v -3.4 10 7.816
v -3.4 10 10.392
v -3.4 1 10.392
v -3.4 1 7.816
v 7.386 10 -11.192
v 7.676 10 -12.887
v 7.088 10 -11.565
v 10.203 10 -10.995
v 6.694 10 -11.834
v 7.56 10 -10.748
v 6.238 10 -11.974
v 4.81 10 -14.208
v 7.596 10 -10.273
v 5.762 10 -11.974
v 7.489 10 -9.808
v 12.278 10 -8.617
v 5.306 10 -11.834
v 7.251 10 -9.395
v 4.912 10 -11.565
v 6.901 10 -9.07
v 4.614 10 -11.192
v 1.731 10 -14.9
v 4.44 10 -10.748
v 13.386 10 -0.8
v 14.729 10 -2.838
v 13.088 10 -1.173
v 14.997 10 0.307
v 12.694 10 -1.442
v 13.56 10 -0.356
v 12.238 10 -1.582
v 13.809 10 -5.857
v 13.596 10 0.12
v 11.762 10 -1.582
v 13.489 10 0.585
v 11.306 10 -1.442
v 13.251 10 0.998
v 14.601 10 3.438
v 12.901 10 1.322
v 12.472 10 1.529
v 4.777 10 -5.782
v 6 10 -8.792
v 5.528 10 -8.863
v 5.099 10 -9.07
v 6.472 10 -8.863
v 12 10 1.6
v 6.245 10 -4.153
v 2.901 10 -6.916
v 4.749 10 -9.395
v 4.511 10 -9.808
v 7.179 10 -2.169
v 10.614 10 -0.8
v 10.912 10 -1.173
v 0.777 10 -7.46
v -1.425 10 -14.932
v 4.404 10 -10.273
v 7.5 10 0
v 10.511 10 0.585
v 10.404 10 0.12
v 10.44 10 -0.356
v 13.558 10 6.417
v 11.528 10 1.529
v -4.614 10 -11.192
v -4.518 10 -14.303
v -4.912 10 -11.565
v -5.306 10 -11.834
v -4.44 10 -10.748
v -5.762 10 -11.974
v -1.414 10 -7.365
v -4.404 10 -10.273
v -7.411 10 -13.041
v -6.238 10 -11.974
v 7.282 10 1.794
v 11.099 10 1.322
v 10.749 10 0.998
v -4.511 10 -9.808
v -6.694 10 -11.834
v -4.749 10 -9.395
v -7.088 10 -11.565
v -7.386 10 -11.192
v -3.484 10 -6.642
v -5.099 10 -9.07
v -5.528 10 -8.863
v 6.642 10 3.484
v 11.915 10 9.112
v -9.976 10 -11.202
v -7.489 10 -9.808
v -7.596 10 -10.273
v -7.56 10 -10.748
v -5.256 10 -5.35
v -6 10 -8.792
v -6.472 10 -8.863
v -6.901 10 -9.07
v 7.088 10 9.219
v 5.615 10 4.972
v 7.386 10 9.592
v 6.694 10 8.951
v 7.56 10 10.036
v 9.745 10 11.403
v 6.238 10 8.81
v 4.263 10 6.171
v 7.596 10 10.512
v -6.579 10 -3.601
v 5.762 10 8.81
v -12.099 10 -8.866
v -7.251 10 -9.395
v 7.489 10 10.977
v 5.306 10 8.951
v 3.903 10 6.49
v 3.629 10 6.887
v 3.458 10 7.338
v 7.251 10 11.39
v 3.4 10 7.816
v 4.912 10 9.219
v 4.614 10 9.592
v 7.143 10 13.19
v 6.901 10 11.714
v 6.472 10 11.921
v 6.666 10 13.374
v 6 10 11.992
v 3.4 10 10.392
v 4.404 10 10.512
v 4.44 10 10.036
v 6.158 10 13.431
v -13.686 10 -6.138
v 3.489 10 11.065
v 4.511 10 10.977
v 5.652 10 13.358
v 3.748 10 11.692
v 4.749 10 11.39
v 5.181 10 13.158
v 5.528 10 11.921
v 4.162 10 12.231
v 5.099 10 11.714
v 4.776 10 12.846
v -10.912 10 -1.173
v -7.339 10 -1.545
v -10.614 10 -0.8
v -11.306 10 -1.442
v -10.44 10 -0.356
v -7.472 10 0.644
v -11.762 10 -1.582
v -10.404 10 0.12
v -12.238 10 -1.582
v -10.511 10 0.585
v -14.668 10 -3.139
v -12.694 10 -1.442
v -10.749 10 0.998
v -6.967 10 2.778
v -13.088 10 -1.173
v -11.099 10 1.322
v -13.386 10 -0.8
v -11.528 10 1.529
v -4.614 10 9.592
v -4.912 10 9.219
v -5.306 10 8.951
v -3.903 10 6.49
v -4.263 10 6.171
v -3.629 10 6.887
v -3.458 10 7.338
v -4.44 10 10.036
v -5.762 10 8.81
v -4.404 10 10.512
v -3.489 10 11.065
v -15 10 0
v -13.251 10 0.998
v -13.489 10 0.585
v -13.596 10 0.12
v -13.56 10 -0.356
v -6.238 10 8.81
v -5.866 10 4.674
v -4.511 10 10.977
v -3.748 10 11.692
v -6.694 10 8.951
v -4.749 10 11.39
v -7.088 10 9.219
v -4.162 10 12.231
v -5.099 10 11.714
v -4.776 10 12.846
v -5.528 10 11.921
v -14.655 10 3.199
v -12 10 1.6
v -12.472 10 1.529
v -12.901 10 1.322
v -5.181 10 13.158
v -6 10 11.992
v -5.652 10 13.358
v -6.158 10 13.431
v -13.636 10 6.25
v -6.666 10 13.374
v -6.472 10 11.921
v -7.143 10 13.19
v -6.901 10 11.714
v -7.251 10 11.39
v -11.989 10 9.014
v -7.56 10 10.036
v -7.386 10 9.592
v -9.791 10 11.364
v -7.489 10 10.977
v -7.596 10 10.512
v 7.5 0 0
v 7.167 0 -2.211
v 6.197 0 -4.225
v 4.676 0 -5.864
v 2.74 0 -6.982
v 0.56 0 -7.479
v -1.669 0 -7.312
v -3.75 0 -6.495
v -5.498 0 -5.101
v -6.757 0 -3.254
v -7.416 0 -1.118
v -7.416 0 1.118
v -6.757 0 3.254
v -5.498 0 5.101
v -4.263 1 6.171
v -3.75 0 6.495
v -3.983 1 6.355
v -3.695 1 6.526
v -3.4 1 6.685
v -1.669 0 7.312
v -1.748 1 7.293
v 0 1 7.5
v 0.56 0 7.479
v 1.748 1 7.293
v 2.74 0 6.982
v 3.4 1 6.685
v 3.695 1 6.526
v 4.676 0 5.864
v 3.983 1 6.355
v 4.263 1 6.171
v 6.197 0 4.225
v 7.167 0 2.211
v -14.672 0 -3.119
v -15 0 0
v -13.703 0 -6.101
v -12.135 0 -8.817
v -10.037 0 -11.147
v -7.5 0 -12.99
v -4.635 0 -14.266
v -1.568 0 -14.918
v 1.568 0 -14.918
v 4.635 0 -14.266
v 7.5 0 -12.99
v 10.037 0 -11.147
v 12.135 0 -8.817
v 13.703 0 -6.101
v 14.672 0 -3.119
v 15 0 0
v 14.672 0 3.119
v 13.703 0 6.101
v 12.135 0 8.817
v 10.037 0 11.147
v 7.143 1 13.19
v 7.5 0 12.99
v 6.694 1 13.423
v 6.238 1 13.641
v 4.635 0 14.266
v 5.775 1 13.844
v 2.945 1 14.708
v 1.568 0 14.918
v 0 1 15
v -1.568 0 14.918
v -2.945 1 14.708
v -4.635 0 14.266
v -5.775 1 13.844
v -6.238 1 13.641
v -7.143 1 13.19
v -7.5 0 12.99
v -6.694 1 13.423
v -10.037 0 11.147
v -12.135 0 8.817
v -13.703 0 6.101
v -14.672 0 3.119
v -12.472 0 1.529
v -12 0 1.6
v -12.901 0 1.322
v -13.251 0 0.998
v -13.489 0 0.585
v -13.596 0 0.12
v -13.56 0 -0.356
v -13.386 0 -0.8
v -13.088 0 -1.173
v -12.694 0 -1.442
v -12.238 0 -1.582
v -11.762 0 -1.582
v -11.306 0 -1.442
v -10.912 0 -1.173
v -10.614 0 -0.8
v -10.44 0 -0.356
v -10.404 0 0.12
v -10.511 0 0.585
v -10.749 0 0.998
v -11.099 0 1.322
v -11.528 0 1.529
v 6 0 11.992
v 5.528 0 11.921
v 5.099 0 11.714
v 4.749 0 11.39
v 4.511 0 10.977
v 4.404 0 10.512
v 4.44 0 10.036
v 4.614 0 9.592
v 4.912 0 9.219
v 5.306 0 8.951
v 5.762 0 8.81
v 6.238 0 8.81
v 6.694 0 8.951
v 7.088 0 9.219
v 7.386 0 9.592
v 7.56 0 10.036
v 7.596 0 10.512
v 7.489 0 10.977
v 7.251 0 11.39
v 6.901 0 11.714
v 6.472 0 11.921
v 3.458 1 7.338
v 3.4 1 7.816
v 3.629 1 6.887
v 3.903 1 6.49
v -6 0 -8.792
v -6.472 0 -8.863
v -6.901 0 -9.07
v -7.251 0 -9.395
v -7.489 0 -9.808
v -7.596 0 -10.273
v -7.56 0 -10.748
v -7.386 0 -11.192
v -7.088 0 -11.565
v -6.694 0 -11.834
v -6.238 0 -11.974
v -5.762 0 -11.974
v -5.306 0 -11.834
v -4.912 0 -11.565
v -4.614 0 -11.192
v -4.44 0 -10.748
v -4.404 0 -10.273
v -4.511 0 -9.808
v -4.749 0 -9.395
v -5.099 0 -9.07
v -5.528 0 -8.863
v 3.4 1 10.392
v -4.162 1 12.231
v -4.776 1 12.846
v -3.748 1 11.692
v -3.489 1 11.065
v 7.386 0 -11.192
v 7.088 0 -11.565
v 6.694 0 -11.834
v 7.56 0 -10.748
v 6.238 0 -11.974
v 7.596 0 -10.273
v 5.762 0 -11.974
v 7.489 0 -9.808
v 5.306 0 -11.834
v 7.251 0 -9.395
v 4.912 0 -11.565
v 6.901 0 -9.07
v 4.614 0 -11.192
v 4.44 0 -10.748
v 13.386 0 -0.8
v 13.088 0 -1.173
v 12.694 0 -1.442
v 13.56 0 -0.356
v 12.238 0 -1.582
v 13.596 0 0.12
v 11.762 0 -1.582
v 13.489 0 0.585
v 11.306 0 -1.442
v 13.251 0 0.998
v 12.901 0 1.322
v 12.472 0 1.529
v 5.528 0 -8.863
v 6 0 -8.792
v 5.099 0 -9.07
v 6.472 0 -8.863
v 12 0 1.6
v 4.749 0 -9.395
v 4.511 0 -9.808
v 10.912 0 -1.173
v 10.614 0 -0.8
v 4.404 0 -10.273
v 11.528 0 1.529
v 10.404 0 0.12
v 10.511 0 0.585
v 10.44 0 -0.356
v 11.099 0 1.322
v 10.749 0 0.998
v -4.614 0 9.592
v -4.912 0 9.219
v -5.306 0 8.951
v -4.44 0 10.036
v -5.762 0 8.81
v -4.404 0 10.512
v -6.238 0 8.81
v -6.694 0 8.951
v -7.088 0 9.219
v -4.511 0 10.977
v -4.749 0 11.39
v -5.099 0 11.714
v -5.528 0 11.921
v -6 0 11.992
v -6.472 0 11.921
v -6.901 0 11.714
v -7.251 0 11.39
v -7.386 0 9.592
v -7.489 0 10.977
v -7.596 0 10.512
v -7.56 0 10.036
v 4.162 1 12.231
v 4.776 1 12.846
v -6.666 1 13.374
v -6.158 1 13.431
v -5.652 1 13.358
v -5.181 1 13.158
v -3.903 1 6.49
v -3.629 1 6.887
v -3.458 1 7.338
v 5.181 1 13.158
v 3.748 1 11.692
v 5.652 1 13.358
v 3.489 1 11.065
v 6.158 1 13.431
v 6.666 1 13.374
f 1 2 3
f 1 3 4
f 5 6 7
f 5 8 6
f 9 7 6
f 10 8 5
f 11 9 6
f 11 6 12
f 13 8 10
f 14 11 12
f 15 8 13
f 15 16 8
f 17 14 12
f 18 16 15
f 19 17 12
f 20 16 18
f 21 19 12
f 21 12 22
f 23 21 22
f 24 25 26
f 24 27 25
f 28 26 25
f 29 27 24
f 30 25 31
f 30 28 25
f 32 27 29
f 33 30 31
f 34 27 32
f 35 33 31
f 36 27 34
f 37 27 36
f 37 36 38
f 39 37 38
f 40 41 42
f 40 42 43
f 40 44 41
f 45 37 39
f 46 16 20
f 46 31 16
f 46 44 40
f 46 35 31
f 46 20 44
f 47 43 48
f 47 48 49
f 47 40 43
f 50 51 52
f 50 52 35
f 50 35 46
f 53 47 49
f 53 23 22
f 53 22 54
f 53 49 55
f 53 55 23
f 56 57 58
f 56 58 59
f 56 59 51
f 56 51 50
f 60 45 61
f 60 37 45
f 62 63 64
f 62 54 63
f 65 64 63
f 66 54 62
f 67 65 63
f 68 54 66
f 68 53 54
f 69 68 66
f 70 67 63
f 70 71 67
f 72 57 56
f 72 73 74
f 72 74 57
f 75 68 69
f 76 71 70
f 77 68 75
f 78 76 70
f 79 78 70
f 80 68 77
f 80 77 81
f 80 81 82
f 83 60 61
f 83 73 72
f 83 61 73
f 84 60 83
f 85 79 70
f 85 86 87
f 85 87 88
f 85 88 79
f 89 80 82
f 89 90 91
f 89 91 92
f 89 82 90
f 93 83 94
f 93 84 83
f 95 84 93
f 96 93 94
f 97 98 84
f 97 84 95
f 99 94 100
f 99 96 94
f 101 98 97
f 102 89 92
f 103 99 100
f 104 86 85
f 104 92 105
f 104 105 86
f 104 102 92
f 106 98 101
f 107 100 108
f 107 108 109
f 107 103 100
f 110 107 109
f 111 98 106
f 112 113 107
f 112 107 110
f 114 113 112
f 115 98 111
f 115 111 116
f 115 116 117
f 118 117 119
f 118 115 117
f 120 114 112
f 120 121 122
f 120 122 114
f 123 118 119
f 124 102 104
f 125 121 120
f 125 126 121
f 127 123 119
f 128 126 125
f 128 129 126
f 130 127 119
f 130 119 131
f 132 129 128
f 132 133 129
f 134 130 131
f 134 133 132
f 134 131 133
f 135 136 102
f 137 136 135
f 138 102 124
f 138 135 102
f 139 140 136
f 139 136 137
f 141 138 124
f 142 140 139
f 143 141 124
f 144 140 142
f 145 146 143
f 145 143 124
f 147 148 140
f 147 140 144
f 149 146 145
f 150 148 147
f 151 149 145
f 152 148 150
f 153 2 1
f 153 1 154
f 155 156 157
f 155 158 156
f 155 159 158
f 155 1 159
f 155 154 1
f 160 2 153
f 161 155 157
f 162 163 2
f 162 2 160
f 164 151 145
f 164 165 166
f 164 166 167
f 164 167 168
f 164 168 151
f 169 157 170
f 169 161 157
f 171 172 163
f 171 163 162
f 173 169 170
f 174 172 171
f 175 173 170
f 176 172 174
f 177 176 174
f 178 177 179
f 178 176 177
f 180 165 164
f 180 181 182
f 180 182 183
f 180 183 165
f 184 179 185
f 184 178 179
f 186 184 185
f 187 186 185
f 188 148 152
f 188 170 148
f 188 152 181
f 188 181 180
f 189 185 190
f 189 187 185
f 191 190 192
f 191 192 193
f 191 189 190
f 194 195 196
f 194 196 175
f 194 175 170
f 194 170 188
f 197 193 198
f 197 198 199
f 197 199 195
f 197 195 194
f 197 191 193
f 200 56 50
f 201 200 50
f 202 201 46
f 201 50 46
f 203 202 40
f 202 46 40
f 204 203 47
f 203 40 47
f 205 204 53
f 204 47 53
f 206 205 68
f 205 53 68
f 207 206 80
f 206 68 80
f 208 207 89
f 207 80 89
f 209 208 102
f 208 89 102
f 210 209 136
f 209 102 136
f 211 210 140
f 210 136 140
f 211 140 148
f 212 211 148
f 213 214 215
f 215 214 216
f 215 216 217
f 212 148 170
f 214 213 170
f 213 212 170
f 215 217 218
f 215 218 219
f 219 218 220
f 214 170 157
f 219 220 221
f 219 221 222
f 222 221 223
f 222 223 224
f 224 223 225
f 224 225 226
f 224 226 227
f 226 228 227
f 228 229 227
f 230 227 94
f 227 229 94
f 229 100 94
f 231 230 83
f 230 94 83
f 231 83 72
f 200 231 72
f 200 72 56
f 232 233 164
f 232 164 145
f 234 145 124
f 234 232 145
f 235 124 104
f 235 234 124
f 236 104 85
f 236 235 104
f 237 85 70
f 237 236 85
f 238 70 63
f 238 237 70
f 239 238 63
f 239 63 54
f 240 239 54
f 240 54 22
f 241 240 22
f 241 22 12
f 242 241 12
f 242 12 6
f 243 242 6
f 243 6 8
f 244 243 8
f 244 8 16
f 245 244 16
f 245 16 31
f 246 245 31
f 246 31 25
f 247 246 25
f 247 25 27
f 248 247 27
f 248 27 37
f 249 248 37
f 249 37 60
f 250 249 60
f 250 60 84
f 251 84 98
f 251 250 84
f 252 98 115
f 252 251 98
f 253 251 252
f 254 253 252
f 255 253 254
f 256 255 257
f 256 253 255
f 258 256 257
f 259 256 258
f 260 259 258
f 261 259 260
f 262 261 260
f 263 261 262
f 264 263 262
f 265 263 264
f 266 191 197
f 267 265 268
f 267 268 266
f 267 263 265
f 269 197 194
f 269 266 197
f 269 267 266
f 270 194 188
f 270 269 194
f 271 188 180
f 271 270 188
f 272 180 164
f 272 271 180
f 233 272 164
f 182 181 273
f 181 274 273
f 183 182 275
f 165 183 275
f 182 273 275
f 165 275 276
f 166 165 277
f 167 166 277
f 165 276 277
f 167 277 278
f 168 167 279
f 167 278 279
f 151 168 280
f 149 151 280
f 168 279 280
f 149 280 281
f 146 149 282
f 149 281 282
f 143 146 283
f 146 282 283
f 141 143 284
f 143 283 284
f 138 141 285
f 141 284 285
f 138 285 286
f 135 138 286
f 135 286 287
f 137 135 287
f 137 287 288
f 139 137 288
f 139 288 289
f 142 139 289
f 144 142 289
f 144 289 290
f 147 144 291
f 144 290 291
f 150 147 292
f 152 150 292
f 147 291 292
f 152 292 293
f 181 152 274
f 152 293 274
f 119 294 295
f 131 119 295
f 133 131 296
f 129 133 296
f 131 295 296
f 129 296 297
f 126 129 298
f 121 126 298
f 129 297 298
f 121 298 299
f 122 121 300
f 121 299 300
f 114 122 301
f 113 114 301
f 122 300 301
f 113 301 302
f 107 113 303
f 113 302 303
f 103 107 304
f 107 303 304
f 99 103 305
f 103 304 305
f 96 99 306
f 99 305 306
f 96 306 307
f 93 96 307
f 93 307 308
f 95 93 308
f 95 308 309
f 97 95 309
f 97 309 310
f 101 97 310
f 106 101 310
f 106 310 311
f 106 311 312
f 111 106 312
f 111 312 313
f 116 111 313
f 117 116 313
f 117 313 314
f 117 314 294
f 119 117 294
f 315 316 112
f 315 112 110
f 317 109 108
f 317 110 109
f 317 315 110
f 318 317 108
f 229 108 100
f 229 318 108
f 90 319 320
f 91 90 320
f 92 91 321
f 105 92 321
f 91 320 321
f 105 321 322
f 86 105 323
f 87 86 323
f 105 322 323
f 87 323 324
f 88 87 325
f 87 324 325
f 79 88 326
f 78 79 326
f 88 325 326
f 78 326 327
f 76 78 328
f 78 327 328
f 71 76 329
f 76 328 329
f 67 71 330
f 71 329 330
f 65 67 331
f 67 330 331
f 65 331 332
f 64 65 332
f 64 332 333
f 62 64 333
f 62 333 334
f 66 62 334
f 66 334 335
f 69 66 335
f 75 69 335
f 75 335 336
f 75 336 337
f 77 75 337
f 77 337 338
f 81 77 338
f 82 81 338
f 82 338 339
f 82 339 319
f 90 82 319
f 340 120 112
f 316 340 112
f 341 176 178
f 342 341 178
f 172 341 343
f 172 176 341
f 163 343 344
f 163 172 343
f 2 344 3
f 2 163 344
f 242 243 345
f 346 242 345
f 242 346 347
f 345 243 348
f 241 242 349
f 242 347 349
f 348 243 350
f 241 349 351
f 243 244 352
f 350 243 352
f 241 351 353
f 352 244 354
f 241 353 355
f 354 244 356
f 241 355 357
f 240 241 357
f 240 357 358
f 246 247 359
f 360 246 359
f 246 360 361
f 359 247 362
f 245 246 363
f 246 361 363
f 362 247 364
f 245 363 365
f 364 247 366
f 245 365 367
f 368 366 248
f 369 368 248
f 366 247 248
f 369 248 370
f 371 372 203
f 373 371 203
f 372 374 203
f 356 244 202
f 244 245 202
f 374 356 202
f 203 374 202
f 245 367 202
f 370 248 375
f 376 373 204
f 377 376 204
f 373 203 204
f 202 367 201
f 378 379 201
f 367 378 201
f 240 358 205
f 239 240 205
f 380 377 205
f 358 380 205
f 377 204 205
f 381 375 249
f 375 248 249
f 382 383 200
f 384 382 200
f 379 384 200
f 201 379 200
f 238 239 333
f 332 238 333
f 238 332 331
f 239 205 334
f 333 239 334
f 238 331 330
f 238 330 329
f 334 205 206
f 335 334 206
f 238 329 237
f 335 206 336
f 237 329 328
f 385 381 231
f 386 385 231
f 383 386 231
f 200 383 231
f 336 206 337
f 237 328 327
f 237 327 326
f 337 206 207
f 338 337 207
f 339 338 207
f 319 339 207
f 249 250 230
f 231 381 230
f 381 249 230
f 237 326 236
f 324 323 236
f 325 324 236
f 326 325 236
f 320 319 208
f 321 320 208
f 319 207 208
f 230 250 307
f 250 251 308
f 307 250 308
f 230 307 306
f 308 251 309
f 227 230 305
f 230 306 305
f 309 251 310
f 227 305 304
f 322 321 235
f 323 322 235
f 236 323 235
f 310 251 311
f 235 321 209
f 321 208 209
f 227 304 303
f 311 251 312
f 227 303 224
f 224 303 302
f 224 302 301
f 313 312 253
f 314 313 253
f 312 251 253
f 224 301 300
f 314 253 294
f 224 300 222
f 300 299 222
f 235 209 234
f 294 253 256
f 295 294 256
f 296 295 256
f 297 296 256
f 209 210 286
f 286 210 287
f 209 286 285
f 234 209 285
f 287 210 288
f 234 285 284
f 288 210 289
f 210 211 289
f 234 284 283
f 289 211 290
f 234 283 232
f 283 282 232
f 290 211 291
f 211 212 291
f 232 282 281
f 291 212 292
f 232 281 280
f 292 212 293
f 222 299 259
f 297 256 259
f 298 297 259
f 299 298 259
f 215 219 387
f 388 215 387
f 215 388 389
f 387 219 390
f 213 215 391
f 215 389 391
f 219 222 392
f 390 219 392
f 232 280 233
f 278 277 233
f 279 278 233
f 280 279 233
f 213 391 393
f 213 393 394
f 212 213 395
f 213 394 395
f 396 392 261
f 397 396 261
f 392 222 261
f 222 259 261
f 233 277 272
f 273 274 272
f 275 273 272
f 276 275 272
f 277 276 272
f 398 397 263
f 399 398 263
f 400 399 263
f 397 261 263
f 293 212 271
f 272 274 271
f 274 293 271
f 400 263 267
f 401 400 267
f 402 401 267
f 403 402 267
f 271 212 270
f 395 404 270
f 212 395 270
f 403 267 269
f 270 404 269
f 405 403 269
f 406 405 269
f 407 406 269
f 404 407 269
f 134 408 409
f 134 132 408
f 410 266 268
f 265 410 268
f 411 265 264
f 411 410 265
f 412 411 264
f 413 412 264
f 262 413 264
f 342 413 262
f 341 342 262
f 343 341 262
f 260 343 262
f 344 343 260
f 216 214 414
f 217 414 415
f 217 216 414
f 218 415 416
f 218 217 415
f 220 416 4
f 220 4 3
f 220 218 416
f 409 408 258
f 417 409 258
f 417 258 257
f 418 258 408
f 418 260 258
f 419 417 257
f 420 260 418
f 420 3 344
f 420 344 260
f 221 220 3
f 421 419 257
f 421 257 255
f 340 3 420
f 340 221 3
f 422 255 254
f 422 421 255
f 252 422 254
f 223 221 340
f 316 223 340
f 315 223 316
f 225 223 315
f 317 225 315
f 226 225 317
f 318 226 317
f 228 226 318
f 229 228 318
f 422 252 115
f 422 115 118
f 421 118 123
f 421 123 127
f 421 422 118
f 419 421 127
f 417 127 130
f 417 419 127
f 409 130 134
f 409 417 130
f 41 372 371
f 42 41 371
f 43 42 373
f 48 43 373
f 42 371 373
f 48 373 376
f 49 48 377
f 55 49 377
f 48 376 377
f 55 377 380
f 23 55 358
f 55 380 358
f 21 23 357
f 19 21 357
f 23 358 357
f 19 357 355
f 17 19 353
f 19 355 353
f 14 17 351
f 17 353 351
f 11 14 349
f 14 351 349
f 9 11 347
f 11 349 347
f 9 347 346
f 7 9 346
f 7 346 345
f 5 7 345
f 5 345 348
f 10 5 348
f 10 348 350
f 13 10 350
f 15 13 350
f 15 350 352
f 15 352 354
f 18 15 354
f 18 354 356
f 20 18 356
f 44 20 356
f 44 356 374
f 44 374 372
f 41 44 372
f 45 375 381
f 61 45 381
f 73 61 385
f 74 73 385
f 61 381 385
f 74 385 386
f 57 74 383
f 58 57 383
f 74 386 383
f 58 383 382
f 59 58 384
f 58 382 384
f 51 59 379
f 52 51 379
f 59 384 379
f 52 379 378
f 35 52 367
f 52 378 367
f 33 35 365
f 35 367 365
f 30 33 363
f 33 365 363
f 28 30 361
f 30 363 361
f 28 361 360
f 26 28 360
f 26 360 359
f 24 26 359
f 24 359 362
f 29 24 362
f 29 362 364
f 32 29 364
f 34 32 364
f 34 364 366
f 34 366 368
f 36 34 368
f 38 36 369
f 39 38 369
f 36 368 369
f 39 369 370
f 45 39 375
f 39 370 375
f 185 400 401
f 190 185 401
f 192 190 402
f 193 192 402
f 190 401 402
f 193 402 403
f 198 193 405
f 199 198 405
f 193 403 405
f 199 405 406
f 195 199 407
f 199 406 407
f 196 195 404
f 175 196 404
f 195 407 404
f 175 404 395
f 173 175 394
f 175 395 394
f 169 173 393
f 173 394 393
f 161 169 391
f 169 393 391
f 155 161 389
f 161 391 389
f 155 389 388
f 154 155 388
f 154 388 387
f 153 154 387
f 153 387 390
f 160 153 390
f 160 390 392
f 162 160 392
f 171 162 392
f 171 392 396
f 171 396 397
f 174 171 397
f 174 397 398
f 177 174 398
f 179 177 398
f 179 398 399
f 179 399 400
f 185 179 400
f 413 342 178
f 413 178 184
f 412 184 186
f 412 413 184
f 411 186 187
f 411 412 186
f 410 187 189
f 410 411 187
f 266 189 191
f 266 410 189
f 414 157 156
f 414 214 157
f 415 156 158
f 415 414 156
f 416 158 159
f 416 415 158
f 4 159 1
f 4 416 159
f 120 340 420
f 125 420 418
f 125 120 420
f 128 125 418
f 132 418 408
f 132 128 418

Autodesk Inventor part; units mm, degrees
ref_plane "YZ Plane" through (0, 0, 0) normal (1, 0, 0) x (0, 1, 0)
ref_plane "XZ Plane" through (0, 0, 0) normal (0, 1, 0) x (-1, 0, 0)
ref_plane "XY Plane" through (0, 0, 0) normal (0, 0, 1) x (1, 0, 0)
sketch "スケッチ1" plane through (0, 0, 0) normal (0, 1, 0) x (-1, 0, 0)
  circle A0 centre (0, 0) radius 15
  dimension "d0" = 30
extrude "押し出し1" add sketch "スケッチ1" along normal blind 10
sketch "スケッチ2" plane through (0, 10, 0) normal (0, 1, 0) x (1, 0, 0)
  circle A0 centre (0, 0) radius 12
  point P0 (-12, 0)
  point P1 (-6, -10.3923)
  point P2 (6, -10.3923)
  point P3 (12, 0)
  point P4 (6, 10.3923)
  point P5 (-6, 10.3923)
  dimension "d3" = 24
  dimension "d6" = 360
hole "穴1" at (-12, 10, 0) at (-6, 10, 10.3923) at (6, 10, 10.3923) at (12, 10, 0) at (6, 10, -10.3923) at (-6, 10, -10.3923) direction (0, -1, 0) diameter 3.2 end through all
sketch "スケッチ3" plane through (0, 10, 0) normal (0, 1, 0) x (1, 0, 0)
  circle A0 centre (0, 0) radius 7.5
  dimension "d15" = 15
extrude "押し出し2" cut sketch "スケッチ3" against normal blind 10
sketch "スケッチ4" plane through (0, 10, 0) normal (0, 1, 0) x (1, 0, 0)
  circle A0 centre (-6, -10.3923) radius 1.6 projected
  circle A1 centre (6, -10.3923) radius 1.6 projected
  line L0 (-6, -10.3923) -> (6, -10.3923)
  circle A2 centre (-6, -10.3923) radius 2.6
  circle A3 centre (6, -10.3923) radius 2.6
  line L1 (-3.4, -10.3923) -> (-3.4, -6.6851)
  circle A4 centre (0, 0) radius 7.5 projected
  line L2 (3.4, -10.3923) -> (3.4, -6.6851)
  line L3 (-4.1615, -12.2308) -> (-5.7746, -13.8439)
  circle A5 centre (0, 0) radius 15 projected
  line L4 (4.1615, -12.2308) -> (5.7746, -13.8439)
  line L5 (-15, 0) -> (0, 0)
  circle A6 centre (-6, 10.3923) radius 2.6
  circle A7 centre (6, 10.3923) radius 2.6
  line L6 (-3.4, 10.3923) -> (-3.4, 6.6851)
  line L7 (3.4, 10.3923) -> (3.4, 6.6851)
  line L8 (-4.1615, 12.2308) -> (-5.7746, 13.8439)
  line L9 (4.1615, 12.2308) -> (5.7746, 13.8439)
  circle A8 centre (0, 0) radius 7.5
  circle A9 centre (0, 0) radius 15
  dimension "d18" = 1
  dimension "d19" = 1
  dimension "d20" = 135
extrude "押し出し3" cut sketch "スケッチ4" against normal blind 9 contours L1 A4 L2 L0 | L0 A3 L4 A5 L3 A2
fillet "フィレット1" radius 2 4 edges at (-3.4, 5.5, 6.6851) (3.4, 5.5, 6.6851) (-5.7746, 5.5, 13.8439) (5.7746, 5.5, 13.8439)
properties part number "servoplate_forR2_2" material "アルミニウム 6061"
